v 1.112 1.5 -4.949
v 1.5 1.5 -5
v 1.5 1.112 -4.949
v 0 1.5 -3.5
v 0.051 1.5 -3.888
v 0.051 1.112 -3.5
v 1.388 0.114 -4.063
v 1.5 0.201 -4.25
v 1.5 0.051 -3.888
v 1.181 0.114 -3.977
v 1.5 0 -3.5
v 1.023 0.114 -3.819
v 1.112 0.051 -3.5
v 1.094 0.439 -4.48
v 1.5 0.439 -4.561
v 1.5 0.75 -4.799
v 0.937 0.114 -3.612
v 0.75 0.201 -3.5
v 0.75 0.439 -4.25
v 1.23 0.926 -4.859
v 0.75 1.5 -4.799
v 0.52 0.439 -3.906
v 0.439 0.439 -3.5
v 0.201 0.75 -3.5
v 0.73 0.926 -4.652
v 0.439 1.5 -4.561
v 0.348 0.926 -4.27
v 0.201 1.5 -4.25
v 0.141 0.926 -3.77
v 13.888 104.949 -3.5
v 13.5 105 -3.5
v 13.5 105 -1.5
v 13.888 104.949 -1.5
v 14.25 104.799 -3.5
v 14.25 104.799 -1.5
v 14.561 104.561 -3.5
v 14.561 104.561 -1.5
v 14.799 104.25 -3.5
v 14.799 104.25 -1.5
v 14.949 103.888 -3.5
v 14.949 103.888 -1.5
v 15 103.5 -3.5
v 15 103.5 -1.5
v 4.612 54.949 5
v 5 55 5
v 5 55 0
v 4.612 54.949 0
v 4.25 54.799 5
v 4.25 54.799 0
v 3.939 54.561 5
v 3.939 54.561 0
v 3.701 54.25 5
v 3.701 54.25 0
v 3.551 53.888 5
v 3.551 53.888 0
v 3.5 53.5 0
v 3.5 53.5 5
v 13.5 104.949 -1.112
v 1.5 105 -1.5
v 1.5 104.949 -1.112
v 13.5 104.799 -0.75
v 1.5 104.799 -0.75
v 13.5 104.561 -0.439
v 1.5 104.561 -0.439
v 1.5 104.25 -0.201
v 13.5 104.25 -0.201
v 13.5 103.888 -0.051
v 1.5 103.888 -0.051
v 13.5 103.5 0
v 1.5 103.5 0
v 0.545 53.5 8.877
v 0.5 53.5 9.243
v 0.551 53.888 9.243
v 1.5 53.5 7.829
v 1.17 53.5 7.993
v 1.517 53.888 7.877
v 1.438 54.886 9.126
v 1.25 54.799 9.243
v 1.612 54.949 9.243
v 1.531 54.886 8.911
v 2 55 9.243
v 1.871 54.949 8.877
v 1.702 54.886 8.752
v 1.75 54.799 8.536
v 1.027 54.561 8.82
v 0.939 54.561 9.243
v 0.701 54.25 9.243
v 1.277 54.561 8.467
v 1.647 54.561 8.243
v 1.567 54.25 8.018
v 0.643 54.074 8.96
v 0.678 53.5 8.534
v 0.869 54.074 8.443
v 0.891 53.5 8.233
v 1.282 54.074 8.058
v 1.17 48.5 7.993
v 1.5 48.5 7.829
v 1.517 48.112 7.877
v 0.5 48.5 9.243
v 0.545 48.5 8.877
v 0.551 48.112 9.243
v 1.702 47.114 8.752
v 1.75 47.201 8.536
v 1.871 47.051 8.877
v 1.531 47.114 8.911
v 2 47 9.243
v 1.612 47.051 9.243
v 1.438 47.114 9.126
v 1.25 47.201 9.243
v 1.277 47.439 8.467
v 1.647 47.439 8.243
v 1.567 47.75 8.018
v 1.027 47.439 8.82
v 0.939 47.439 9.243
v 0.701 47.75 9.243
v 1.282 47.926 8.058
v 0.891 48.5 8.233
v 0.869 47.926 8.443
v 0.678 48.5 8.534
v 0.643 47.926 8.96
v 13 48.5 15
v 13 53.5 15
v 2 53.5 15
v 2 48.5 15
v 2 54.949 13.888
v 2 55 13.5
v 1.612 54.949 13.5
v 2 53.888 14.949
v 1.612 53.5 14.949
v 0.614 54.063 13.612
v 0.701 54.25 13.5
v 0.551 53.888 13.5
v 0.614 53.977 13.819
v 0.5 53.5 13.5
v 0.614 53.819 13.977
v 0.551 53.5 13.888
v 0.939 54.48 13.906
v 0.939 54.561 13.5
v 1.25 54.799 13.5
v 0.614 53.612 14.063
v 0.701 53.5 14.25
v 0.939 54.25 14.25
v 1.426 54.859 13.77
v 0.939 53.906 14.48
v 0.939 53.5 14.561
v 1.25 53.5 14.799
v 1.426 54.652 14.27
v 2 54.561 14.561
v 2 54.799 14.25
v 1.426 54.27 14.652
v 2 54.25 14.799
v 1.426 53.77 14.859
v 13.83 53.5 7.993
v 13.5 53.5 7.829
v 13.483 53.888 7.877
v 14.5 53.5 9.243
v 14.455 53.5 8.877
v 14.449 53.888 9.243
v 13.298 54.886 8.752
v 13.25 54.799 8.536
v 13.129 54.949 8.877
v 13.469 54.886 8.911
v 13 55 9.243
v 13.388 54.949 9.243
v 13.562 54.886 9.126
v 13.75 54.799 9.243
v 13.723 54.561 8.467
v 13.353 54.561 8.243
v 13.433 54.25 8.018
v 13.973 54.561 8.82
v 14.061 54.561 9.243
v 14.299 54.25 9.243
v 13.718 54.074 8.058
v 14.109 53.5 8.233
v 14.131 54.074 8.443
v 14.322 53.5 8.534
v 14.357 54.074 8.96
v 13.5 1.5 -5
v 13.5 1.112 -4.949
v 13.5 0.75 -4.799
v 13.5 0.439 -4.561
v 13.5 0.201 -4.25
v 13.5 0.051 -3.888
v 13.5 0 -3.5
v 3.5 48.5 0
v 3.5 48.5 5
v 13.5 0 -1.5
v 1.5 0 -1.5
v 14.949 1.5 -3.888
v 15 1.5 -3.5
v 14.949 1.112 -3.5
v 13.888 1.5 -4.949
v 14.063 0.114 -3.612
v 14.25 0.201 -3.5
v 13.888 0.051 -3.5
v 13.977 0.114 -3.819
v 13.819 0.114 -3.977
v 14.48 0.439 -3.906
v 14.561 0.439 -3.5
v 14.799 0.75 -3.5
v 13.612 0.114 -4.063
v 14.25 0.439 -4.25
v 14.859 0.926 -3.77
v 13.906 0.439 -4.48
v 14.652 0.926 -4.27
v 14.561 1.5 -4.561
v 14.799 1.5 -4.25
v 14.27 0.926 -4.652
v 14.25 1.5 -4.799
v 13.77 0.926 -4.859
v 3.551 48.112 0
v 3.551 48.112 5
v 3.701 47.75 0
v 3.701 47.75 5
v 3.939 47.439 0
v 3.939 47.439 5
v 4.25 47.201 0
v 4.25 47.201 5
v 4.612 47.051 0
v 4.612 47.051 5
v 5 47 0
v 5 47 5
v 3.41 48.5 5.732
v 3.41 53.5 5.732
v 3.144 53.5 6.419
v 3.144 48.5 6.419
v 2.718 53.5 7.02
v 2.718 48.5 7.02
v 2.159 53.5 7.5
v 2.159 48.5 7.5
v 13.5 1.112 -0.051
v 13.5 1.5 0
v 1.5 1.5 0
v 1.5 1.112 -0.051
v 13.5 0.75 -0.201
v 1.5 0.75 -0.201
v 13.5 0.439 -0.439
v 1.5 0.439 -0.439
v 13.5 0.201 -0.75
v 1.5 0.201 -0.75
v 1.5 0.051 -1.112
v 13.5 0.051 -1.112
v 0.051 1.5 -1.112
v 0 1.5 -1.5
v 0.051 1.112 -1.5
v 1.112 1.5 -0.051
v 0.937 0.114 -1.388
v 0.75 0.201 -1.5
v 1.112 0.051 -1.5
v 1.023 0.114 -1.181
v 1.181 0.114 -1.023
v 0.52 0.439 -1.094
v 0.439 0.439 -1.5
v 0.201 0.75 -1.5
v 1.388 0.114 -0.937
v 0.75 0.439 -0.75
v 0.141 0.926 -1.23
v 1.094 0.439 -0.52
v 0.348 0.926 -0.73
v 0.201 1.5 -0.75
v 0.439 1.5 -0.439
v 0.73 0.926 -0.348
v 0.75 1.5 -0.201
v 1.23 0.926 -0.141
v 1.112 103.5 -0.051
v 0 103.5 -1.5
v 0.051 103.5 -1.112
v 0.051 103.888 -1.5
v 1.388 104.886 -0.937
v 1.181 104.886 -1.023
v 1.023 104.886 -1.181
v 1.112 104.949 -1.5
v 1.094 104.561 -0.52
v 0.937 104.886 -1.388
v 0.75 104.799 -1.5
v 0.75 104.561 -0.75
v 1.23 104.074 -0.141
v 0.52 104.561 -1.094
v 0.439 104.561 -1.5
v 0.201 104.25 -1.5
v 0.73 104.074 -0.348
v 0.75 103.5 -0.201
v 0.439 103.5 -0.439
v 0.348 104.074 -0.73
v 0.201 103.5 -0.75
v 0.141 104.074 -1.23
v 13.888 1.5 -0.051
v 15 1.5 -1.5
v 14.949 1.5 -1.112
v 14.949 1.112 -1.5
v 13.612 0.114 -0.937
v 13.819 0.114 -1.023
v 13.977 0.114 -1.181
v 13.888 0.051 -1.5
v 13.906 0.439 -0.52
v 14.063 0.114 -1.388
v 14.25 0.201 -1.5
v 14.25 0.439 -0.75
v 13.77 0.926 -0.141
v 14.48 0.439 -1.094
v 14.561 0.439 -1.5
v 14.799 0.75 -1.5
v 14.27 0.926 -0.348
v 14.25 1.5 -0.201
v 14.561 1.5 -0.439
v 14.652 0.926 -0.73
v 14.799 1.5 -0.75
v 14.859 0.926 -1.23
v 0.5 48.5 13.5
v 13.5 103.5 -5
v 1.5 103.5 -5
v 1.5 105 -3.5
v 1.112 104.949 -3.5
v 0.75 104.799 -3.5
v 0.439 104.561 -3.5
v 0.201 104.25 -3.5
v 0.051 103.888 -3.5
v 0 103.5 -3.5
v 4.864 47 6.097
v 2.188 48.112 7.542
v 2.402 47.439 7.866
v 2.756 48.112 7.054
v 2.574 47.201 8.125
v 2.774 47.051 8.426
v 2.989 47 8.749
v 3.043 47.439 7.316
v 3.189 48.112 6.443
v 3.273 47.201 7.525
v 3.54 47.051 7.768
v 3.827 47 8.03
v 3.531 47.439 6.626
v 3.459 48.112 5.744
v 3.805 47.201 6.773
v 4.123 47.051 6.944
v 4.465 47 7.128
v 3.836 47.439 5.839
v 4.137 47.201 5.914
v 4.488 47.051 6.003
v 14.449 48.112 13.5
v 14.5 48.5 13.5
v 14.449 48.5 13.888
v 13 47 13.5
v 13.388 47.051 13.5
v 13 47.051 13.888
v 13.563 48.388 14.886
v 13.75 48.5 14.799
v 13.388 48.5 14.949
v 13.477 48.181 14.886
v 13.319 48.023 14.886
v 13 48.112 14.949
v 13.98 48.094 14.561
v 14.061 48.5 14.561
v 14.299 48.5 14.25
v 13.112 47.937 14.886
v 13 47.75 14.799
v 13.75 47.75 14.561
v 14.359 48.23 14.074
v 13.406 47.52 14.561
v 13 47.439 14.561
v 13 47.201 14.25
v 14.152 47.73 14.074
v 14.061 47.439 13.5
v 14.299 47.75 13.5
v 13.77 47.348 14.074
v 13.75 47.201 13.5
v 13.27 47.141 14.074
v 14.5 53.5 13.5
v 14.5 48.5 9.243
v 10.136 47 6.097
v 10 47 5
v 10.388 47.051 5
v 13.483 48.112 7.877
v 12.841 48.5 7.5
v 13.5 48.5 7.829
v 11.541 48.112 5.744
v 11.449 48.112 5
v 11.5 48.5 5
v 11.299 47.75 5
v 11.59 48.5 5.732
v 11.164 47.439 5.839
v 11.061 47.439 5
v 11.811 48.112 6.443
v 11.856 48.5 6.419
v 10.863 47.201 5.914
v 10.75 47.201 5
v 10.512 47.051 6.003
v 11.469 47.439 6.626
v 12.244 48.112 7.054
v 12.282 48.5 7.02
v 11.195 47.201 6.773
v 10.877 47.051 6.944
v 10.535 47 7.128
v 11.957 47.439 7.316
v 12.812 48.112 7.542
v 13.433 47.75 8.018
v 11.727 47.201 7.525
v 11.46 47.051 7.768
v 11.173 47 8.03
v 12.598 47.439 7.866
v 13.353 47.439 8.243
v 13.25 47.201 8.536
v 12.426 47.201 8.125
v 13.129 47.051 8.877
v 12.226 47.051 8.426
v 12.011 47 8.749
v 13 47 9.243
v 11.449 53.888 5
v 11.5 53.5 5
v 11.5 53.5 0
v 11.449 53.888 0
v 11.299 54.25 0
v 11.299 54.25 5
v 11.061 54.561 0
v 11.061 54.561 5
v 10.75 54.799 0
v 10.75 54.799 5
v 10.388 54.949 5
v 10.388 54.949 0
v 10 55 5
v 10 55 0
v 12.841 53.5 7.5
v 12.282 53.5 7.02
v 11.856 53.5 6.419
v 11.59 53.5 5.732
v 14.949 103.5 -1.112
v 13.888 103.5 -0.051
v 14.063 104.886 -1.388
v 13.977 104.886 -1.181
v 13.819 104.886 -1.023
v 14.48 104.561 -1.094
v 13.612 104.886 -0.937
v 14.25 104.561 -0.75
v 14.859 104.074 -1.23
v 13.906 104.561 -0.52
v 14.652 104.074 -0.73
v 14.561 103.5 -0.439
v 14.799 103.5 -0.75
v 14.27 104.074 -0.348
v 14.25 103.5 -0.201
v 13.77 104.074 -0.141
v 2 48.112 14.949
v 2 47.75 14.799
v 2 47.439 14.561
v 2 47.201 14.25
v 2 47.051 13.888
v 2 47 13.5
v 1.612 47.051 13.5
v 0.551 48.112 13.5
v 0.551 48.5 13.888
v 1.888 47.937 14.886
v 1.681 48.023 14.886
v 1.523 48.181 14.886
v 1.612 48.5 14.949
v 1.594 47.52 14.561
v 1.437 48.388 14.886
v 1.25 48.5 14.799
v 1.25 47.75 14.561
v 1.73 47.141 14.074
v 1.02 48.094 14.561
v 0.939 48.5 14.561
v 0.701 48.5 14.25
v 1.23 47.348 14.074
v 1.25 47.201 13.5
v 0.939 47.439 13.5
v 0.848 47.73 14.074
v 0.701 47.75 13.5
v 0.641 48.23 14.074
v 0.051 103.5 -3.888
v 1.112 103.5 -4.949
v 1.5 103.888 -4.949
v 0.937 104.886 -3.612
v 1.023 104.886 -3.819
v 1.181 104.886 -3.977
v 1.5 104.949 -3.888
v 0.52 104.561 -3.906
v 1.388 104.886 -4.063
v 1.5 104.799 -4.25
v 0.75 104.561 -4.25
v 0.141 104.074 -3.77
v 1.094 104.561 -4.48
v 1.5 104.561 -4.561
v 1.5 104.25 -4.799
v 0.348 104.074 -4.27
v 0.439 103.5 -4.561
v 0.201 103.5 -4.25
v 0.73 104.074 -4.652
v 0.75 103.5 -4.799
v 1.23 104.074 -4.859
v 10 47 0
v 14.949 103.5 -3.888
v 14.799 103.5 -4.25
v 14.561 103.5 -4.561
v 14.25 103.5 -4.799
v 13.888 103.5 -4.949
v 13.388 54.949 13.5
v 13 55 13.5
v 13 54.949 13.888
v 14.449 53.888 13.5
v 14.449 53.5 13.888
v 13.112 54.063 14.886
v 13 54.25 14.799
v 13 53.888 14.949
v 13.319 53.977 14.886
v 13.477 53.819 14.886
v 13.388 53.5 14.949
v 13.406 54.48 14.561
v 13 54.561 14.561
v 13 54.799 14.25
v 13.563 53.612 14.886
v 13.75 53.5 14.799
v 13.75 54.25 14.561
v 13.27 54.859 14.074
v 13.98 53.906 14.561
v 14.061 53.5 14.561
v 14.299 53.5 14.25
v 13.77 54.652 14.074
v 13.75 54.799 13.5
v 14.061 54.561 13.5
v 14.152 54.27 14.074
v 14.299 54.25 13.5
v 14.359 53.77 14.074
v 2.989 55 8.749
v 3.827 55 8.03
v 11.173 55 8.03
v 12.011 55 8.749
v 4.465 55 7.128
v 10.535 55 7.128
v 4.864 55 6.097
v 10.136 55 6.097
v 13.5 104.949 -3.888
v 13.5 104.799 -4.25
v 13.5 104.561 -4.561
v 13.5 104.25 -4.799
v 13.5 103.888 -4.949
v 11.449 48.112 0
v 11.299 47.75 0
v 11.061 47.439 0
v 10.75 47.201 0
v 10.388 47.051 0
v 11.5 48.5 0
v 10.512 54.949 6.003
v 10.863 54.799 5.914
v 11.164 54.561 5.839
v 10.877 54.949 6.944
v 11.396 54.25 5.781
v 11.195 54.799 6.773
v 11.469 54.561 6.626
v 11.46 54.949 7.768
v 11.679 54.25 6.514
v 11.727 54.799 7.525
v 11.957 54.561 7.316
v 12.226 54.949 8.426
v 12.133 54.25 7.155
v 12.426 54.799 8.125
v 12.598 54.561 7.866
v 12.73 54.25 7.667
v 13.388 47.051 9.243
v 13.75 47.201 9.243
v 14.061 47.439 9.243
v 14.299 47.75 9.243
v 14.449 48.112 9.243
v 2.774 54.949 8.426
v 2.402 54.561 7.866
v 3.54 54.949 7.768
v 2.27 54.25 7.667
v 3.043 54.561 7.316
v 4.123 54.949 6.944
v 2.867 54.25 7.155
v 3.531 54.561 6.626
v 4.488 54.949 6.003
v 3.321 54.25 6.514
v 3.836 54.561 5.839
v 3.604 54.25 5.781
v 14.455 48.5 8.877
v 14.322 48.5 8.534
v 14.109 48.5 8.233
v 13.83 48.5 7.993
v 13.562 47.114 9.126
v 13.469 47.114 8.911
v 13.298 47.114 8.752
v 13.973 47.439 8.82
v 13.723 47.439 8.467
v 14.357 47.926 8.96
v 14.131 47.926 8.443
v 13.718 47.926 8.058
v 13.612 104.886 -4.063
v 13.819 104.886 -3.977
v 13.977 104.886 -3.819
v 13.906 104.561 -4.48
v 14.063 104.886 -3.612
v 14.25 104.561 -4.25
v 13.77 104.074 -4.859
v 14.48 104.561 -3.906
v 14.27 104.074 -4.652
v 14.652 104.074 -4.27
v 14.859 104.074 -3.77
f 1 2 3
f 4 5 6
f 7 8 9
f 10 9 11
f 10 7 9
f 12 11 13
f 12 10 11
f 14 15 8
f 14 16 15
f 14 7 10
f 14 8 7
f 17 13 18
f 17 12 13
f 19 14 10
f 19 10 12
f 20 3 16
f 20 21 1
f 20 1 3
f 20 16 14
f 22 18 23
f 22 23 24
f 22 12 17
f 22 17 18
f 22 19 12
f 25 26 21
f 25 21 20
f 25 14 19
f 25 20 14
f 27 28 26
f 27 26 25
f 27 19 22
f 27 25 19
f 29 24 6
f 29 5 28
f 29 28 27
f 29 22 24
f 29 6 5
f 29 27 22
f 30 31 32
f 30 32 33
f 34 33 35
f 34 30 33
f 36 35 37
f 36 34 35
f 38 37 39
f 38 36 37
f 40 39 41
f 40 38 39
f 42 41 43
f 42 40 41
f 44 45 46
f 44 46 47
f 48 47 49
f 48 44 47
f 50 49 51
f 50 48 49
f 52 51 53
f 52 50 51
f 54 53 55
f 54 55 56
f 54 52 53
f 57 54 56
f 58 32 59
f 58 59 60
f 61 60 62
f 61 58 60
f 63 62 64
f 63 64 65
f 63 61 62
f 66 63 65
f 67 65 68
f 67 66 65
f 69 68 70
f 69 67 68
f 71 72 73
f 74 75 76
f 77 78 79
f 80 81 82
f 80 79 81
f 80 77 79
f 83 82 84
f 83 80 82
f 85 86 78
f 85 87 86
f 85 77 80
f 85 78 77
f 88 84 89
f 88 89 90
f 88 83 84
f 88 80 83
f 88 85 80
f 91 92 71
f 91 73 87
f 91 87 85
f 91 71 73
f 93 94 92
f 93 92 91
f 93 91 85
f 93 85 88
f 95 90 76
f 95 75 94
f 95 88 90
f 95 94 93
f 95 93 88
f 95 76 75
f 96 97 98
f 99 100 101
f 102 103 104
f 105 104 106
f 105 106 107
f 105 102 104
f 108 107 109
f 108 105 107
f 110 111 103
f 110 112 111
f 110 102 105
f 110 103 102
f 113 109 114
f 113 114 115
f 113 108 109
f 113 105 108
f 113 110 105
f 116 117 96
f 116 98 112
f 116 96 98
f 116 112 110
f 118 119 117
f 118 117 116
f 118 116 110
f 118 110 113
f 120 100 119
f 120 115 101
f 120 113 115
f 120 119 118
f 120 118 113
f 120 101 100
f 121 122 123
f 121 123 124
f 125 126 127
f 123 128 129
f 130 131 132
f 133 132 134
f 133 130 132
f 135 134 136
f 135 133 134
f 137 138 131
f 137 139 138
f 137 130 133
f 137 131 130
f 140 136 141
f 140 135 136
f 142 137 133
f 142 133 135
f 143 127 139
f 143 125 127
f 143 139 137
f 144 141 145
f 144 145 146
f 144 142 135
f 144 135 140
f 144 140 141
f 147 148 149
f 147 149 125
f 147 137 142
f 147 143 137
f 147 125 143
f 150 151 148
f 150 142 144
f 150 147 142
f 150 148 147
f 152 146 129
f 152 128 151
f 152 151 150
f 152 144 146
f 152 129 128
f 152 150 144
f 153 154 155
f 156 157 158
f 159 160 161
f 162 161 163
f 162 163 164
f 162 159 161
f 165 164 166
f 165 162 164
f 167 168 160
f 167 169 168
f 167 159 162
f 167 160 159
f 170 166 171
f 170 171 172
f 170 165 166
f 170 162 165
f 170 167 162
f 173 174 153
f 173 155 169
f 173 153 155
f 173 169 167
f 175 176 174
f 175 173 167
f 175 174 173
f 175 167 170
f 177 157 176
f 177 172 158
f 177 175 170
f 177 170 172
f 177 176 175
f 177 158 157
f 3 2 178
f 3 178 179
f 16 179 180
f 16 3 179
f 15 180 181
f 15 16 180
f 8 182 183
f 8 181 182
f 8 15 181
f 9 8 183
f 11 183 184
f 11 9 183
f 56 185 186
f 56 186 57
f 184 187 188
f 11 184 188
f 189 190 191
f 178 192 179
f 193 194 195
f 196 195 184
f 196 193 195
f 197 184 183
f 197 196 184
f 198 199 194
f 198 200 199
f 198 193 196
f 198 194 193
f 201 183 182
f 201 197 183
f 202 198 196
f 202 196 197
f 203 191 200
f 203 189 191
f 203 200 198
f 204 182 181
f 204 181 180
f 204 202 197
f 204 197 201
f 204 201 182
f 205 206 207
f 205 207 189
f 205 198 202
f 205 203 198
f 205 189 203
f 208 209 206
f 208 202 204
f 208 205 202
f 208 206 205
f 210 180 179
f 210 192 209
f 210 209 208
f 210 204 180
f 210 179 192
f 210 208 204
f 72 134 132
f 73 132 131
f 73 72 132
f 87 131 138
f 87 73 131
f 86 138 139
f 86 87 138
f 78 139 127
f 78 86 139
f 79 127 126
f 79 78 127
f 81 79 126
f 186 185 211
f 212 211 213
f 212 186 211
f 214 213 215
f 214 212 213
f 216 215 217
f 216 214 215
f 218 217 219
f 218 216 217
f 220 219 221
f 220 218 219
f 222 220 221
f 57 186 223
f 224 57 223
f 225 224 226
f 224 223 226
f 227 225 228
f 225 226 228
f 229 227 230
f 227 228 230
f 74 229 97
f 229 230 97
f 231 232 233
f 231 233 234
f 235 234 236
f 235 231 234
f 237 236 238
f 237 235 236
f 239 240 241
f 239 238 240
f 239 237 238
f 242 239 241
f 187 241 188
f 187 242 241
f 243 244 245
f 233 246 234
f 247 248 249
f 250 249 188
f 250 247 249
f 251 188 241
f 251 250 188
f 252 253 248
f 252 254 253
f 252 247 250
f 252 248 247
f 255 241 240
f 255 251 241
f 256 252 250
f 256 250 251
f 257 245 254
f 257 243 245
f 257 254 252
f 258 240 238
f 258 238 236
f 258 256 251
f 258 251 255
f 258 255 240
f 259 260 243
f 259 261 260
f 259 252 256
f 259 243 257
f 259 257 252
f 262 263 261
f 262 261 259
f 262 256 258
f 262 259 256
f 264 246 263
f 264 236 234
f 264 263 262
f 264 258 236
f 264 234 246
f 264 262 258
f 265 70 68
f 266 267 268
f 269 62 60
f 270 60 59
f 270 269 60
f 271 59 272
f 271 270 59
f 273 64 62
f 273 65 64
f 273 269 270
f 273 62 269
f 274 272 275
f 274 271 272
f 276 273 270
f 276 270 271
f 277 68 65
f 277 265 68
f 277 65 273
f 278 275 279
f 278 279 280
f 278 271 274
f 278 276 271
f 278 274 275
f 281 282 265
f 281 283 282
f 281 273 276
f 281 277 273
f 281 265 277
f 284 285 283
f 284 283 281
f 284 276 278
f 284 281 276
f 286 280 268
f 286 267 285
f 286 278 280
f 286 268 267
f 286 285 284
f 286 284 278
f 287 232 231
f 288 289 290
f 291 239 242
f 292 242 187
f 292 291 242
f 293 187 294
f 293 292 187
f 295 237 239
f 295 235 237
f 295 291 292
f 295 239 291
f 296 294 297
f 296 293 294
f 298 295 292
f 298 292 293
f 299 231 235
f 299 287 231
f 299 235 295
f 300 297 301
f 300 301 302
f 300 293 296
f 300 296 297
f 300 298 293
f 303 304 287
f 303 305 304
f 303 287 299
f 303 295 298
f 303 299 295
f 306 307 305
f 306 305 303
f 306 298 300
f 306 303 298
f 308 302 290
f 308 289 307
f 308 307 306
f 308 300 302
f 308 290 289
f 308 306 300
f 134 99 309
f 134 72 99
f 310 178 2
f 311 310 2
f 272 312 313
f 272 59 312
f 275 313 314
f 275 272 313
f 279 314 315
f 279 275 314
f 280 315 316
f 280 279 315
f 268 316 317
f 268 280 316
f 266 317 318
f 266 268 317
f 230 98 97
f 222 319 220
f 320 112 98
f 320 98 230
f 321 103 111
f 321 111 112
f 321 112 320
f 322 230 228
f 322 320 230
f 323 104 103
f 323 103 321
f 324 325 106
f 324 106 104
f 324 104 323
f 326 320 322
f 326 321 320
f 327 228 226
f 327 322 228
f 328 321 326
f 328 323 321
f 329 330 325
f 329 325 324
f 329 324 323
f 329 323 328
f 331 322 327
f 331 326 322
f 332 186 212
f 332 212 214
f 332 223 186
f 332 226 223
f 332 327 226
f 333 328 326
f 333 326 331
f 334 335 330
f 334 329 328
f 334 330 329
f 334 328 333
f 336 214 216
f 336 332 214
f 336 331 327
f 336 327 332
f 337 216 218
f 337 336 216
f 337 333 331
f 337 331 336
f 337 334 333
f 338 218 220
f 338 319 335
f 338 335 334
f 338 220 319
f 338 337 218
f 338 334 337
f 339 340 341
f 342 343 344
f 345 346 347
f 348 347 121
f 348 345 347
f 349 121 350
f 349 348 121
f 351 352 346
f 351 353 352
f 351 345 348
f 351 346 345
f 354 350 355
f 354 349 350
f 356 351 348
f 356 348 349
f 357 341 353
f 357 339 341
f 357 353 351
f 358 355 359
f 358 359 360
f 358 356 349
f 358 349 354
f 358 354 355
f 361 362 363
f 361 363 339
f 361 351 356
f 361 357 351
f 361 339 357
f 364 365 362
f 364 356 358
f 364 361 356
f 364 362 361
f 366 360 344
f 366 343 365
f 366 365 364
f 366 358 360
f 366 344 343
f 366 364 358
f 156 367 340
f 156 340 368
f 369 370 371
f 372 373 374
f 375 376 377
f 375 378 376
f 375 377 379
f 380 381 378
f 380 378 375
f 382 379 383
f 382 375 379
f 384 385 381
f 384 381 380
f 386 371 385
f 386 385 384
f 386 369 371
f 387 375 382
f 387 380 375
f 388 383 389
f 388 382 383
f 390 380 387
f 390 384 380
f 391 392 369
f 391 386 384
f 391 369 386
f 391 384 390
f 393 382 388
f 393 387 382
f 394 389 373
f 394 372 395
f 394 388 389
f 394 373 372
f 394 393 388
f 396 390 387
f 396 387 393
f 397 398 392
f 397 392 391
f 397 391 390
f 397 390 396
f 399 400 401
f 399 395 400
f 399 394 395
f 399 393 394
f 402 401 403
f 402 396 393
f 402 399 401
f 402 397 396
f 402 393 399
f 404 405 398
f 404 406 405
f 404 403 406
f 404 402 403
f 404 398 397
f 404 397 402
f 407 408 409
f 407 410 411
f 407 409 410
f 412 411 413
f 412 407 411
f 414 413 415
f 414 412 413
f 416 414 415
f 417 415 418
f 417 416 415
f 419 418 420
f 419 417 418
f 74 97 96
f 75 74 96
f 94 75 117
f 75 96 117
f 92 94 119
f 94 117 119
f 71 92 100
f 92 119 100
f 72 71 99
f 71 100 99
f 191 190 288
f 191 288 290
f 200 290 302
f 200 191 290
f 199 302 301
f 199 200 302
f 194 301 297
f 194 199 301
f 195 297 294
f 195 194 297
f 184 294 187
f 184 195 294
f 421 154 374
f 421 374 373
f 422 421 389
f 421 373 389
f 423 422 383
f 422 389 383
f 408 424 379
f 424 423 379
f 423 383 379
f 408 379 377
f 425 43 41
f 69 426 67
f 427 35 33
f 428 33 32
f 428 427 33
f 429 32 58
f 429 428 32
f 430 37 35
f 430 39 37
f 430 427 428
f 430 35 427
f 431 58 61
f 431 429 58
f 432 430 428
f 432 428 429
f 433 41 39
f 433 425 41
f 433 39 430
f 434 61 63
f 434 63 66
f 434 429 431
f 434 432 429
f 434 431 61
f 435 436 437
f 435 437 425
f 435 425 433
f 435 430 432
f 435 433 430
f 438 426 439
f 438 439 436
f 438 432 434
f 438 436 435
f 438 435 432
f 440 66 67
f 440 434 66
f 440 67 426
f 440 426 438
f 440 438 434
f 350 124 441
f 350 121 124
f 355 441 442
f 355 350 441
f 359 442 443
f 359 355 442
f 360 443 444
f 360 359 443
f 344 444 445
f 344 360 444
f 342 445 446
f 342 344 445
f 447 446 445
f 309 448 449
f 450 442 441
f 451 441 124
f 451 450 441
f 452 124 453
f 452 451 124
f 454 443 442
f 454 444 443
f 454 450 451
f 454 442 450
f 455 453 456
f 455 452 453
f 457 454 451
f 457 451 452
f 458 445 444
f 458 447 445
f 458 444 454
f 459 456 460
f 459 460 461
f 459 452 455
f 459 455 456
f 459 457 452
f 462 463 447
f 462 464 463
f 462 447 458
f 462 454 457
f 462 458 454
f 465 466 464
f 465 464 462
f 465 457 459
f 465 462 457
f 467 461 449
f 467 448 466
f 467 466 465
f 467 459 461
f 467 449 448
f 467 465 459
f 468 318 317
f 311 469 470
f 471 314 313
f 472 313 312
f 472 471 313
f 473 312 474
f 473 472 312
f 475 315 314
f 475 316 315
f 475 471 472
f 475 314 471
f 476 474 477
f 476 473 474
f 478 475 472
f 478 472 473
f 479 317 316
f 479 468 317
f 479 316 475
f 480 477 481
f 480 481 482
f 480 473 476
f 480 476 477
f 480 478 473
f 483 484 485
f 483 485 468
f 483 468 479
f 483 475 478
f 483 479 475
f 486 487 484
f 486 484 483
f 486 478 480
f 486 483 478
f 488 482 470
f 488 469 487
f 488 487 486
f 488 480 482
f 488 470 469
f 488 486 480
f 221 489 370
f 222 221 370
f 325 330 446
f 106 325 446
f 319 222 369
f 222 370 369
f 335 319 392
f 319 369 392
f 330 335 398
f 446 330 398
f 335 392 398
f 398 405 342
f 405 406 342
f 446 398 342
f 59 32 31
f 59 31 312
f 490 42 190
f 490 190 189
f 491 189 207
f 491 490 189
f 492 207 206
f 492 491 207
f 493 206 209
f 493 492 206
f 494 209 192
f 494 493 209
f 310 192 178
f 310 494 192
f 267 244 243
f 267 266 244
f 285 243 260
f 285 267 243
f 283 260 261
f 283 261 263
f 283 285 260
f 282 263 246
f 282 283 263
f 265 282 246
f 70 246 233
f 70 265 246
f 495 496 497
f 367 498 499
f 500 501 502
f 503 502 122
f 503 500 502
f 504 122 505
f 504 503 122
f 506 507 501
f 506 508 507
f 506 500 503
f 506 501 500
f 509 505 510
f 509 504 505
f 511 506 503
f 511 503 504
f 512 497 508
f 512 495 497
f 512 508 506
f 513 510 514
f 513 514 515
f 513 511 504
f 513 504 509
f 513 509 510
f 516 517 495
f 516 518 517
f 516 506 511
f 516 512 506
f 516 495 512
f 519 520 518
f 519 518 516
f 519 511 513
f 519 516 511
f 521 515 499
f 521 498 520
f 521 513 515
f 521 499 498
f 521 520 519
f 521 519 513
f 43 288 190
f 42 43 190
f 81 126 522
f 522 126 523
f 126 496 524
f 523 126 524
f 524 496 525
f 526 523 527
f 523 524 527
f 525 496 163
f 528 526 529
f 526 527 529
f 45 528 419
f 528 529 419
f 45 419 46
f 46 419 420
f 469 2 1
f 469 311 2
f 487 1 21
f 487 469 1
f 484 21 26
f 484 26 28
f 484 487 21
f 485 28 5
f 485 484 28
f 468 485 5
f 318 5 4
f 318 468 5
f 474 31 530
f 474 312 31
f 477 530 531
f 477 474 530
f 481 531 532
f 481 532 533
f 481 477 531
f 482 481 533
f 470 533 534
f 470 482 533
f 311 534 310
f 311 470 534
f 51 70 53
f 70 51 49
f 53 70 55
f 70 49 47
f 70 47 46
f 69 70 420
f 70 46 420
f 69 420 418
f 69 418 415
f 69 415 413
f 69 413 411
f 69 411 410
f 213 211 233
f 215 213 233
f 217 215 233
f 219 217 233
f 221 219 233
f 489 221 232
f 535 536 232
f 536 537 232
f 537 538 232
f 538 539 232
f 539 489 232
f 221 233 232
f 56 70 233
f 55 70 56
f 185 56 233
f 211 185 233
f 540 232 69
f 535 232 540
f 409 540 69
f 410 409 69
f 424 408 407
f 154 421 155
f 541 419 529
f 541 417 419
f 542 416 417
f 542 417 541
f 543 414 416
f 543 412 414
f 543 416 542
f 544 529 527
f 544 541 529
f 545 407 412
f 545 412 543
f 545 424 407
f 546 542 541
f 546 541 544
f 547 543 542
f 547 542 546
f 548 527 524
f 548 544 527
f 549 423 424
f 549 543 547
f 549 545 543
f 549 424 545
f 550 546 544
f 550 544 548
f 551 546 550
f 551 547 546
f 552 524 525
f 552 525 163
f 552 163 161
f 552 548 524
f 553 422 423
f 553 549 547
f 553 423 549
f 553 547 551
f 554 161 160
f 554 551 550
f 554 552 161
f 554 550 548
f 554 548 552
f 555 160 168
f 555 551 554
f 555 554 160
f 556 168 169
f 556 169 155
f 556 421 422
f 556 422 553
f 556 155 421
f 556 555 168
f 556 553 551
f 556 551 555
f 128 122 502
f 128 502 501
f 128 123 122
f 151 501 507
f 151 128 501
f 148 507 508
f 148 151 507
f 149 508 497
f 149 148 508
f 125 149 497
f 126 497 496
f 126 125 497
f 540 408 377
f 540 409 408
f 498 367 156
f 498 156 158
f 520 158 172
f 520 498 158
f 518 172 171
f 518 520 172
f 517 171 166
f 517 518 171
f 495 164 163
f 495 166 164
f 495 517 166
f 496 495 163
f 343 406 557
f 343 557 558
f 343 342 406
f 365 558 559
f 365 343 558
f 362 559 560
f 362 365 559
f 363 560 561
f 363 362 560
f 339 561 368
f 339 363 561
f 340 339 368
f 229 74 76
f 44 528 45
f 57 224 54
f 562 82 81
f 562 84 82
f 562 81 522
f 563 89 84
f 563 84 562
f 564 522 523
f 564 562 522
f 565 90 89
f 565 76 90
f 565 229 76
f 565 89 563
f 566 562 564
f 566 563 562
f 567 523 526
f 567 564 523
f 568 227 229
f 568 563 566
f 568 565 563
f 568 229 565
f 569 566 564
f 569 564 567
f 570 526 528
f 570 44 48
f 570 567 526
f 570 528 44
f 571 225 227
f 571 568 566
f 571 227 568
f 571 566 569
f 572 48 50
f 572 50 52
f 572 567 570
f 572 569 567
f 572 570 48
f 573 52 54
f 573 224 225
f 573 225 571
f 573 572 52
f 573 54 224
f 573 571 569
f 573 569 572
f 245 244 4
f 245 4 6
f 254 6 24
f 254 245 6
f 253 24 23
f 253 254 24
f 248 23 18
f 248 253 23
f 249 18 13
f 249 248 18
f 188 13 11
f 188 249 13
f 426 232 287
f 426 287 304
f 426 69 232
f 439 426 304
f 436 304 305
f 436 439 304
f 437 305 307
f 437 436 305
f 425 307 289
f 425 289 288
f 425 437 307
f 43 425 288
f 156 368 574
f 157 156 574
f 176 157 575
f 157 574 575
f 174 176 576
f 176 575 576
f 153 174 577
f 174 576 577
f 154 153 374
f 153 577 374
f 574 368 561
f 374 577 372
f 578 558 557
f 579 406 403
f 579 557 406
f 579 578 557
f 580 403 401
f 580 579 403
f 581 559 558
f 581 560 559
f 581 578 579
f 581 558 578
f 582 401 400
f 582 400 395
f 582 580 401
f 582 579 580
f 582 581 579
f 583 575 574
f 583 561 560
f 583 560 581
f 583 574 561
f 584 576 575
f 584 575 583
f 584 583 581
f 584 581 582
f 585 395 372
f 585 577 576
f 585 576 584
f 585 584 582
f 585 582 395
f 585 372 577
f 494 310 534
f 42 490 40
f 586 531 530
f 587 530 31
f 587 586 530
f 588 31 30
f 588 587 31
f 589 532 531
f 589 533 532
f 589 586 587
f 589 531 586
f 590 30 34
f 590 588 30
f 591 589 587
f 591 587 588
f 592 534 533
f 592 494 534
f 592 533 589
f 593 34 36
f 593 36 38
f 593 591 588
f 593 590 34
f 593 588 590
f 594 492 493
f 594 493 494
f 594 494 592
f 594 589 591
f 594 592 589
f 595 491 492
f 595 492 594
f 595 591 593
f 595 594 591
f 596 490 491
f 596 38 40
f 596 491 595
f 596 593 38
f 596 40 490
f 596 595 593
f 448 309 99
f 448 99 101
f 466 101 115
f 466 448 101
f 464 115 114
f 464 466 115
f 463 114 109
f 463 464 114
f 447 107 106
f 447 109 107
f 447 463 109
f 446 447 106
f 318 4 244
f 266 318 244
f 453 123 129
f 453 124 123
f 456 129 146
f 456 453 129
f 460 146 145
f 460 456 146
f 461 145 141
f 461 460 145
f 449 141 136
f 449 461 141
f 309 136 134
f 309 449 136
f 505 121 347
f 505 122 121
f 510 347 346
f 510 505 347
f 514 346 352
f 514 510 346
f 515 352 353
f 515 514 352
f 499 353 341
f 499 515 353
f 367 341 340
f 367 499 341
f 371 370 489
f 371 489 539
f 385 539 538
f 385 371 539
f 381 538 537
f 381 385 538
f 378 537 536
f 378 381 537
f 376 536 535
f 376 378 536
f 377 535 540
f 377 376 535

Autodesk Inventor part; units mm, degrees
ref_plane "YZ Plane" through (0, 0, 0) normal (1, 0, 0) x (0, 1, 0)
ref_plane "XZ Plane" through (0, 0, 0) normal (0, 1, 0) x (-1, 0, 0)
ref_plane "XY Plane" through (0, 0, 0) normal (0, 0, 1) x (1, 0, 0)
sketch "Sketch1" plane through (0, 0, 0) normal (0, 1, 0) x (-1, 0, 0)
  line L0 (0, 0) -> (-15, 0)
  line L1 (-15, 0) -> (-15, -5)
  line L2 (-15, -5) -> (0, -5)
  line L3 (0, -5) -> (0, 0)
  dimension "d2" = 15
  dimension "d3" = 5
extrude "Extrusion1" add sketch "Sketch1" along normal blind 105
sketch "Sketch2" plane through (0, 0, 0) normal (0, 0, 1) x (1, 0, 0)
  line L0 (3.5, 55) -> (11.5, 55)
  line L1 (11.5, 55) -> (11.5, 47)
  line L2 (11.5, 47) -> (3.5, 47)
  line L3 (3.5, 47) -> (3.5, 55)
  line L4 (0, 0) -> (15, 0) projected
  point P0 (7.5, 47)
  point P1 (7.5, 0)
  dimension "d6" = 8
  dimension "d7" = 8
  dimension "d8" = 55
extrude "Extrusion2" add sketch "Sketch2" along normal blind 15
sketch "Sketch3" plane through (11.5, 47, 0) normal (1, 0, 0) x (0, 0, -1)
  line L0 (0, 8) -> (-15, 8) projected
  line L1 (-15, 8) -> (-8, 8)
  line L2 (-8, 8) -> (-8, 0)
  line L3 (-8, 0) -> (-15, 0)
  line L4 (-15, 0) -> (-15, 8)
  point P0 (0, -47)
  dimension "d11" = 7
  dimension "d12" = 8
extrude "Extrusion3" add sketch "Sketch3" along normal blind 3
sketch "Sketch4" plane through (3.5, 47, 0) normal (-1, 0, 0) x (0, 0, 1)
  line L0 (15, 8) -> (15, 0) projected
  line L1 (15, 8) -> (8, 8)
  line L2 (8, 8) -> (8, 0)
  line L3 (8, 0) -> (15, 0)
  line L4 (15, 0) -> (15, 8)
  point P0 (0, -47)
  dimension "d15" = 7
  dimension "d16" = 8
extrude "Extrusion4" add sketch "Sketch4" along normal blind 3
fillet "Fillet1" radius 3 2 edges at (3.5, 51, 8) (11.5, 51, 8)
fillet "Fillet2" radius 1.5 20 edges at (14.4998, 47, 8) (14.5, 51, 8) (14.4997, 55, 8) (14.4995, 51, 8) (11.5, 55, 2.5002) (14.5, 55, 11.5) (11.5, 47, 2.5002) (3.5, 47, 2.5002) (0.5, 47, 11.5) (14.5, 47, 11.5) (7.5, 47, 15) (7.5, 55, 15) (0.5, 51, 15) (14.5, 51, 15) (0.5003, 47, 8) (0.5003, 55, 8) (0.5005, 51, 8) (0.5, 51, 8) (3.5, 55, 2.5002) (0.5, 55, 11.5)
fillet "Fillet3" radius 1.5 12 edges at (15, 52.5, 0) (0, 52.5, 0) (0, 52.5, -5) (15, 52.5, -5) (7.5, 105, 0) (15, 105, -2.5) (7.5, 105, -5) (0, 105, -2.5) (7.5, 0, -5) (0, 0, -2.5) (7.5, 0, 0) (15, 0, -2.5)
properties part number "Latch Slide" material "Steel"
